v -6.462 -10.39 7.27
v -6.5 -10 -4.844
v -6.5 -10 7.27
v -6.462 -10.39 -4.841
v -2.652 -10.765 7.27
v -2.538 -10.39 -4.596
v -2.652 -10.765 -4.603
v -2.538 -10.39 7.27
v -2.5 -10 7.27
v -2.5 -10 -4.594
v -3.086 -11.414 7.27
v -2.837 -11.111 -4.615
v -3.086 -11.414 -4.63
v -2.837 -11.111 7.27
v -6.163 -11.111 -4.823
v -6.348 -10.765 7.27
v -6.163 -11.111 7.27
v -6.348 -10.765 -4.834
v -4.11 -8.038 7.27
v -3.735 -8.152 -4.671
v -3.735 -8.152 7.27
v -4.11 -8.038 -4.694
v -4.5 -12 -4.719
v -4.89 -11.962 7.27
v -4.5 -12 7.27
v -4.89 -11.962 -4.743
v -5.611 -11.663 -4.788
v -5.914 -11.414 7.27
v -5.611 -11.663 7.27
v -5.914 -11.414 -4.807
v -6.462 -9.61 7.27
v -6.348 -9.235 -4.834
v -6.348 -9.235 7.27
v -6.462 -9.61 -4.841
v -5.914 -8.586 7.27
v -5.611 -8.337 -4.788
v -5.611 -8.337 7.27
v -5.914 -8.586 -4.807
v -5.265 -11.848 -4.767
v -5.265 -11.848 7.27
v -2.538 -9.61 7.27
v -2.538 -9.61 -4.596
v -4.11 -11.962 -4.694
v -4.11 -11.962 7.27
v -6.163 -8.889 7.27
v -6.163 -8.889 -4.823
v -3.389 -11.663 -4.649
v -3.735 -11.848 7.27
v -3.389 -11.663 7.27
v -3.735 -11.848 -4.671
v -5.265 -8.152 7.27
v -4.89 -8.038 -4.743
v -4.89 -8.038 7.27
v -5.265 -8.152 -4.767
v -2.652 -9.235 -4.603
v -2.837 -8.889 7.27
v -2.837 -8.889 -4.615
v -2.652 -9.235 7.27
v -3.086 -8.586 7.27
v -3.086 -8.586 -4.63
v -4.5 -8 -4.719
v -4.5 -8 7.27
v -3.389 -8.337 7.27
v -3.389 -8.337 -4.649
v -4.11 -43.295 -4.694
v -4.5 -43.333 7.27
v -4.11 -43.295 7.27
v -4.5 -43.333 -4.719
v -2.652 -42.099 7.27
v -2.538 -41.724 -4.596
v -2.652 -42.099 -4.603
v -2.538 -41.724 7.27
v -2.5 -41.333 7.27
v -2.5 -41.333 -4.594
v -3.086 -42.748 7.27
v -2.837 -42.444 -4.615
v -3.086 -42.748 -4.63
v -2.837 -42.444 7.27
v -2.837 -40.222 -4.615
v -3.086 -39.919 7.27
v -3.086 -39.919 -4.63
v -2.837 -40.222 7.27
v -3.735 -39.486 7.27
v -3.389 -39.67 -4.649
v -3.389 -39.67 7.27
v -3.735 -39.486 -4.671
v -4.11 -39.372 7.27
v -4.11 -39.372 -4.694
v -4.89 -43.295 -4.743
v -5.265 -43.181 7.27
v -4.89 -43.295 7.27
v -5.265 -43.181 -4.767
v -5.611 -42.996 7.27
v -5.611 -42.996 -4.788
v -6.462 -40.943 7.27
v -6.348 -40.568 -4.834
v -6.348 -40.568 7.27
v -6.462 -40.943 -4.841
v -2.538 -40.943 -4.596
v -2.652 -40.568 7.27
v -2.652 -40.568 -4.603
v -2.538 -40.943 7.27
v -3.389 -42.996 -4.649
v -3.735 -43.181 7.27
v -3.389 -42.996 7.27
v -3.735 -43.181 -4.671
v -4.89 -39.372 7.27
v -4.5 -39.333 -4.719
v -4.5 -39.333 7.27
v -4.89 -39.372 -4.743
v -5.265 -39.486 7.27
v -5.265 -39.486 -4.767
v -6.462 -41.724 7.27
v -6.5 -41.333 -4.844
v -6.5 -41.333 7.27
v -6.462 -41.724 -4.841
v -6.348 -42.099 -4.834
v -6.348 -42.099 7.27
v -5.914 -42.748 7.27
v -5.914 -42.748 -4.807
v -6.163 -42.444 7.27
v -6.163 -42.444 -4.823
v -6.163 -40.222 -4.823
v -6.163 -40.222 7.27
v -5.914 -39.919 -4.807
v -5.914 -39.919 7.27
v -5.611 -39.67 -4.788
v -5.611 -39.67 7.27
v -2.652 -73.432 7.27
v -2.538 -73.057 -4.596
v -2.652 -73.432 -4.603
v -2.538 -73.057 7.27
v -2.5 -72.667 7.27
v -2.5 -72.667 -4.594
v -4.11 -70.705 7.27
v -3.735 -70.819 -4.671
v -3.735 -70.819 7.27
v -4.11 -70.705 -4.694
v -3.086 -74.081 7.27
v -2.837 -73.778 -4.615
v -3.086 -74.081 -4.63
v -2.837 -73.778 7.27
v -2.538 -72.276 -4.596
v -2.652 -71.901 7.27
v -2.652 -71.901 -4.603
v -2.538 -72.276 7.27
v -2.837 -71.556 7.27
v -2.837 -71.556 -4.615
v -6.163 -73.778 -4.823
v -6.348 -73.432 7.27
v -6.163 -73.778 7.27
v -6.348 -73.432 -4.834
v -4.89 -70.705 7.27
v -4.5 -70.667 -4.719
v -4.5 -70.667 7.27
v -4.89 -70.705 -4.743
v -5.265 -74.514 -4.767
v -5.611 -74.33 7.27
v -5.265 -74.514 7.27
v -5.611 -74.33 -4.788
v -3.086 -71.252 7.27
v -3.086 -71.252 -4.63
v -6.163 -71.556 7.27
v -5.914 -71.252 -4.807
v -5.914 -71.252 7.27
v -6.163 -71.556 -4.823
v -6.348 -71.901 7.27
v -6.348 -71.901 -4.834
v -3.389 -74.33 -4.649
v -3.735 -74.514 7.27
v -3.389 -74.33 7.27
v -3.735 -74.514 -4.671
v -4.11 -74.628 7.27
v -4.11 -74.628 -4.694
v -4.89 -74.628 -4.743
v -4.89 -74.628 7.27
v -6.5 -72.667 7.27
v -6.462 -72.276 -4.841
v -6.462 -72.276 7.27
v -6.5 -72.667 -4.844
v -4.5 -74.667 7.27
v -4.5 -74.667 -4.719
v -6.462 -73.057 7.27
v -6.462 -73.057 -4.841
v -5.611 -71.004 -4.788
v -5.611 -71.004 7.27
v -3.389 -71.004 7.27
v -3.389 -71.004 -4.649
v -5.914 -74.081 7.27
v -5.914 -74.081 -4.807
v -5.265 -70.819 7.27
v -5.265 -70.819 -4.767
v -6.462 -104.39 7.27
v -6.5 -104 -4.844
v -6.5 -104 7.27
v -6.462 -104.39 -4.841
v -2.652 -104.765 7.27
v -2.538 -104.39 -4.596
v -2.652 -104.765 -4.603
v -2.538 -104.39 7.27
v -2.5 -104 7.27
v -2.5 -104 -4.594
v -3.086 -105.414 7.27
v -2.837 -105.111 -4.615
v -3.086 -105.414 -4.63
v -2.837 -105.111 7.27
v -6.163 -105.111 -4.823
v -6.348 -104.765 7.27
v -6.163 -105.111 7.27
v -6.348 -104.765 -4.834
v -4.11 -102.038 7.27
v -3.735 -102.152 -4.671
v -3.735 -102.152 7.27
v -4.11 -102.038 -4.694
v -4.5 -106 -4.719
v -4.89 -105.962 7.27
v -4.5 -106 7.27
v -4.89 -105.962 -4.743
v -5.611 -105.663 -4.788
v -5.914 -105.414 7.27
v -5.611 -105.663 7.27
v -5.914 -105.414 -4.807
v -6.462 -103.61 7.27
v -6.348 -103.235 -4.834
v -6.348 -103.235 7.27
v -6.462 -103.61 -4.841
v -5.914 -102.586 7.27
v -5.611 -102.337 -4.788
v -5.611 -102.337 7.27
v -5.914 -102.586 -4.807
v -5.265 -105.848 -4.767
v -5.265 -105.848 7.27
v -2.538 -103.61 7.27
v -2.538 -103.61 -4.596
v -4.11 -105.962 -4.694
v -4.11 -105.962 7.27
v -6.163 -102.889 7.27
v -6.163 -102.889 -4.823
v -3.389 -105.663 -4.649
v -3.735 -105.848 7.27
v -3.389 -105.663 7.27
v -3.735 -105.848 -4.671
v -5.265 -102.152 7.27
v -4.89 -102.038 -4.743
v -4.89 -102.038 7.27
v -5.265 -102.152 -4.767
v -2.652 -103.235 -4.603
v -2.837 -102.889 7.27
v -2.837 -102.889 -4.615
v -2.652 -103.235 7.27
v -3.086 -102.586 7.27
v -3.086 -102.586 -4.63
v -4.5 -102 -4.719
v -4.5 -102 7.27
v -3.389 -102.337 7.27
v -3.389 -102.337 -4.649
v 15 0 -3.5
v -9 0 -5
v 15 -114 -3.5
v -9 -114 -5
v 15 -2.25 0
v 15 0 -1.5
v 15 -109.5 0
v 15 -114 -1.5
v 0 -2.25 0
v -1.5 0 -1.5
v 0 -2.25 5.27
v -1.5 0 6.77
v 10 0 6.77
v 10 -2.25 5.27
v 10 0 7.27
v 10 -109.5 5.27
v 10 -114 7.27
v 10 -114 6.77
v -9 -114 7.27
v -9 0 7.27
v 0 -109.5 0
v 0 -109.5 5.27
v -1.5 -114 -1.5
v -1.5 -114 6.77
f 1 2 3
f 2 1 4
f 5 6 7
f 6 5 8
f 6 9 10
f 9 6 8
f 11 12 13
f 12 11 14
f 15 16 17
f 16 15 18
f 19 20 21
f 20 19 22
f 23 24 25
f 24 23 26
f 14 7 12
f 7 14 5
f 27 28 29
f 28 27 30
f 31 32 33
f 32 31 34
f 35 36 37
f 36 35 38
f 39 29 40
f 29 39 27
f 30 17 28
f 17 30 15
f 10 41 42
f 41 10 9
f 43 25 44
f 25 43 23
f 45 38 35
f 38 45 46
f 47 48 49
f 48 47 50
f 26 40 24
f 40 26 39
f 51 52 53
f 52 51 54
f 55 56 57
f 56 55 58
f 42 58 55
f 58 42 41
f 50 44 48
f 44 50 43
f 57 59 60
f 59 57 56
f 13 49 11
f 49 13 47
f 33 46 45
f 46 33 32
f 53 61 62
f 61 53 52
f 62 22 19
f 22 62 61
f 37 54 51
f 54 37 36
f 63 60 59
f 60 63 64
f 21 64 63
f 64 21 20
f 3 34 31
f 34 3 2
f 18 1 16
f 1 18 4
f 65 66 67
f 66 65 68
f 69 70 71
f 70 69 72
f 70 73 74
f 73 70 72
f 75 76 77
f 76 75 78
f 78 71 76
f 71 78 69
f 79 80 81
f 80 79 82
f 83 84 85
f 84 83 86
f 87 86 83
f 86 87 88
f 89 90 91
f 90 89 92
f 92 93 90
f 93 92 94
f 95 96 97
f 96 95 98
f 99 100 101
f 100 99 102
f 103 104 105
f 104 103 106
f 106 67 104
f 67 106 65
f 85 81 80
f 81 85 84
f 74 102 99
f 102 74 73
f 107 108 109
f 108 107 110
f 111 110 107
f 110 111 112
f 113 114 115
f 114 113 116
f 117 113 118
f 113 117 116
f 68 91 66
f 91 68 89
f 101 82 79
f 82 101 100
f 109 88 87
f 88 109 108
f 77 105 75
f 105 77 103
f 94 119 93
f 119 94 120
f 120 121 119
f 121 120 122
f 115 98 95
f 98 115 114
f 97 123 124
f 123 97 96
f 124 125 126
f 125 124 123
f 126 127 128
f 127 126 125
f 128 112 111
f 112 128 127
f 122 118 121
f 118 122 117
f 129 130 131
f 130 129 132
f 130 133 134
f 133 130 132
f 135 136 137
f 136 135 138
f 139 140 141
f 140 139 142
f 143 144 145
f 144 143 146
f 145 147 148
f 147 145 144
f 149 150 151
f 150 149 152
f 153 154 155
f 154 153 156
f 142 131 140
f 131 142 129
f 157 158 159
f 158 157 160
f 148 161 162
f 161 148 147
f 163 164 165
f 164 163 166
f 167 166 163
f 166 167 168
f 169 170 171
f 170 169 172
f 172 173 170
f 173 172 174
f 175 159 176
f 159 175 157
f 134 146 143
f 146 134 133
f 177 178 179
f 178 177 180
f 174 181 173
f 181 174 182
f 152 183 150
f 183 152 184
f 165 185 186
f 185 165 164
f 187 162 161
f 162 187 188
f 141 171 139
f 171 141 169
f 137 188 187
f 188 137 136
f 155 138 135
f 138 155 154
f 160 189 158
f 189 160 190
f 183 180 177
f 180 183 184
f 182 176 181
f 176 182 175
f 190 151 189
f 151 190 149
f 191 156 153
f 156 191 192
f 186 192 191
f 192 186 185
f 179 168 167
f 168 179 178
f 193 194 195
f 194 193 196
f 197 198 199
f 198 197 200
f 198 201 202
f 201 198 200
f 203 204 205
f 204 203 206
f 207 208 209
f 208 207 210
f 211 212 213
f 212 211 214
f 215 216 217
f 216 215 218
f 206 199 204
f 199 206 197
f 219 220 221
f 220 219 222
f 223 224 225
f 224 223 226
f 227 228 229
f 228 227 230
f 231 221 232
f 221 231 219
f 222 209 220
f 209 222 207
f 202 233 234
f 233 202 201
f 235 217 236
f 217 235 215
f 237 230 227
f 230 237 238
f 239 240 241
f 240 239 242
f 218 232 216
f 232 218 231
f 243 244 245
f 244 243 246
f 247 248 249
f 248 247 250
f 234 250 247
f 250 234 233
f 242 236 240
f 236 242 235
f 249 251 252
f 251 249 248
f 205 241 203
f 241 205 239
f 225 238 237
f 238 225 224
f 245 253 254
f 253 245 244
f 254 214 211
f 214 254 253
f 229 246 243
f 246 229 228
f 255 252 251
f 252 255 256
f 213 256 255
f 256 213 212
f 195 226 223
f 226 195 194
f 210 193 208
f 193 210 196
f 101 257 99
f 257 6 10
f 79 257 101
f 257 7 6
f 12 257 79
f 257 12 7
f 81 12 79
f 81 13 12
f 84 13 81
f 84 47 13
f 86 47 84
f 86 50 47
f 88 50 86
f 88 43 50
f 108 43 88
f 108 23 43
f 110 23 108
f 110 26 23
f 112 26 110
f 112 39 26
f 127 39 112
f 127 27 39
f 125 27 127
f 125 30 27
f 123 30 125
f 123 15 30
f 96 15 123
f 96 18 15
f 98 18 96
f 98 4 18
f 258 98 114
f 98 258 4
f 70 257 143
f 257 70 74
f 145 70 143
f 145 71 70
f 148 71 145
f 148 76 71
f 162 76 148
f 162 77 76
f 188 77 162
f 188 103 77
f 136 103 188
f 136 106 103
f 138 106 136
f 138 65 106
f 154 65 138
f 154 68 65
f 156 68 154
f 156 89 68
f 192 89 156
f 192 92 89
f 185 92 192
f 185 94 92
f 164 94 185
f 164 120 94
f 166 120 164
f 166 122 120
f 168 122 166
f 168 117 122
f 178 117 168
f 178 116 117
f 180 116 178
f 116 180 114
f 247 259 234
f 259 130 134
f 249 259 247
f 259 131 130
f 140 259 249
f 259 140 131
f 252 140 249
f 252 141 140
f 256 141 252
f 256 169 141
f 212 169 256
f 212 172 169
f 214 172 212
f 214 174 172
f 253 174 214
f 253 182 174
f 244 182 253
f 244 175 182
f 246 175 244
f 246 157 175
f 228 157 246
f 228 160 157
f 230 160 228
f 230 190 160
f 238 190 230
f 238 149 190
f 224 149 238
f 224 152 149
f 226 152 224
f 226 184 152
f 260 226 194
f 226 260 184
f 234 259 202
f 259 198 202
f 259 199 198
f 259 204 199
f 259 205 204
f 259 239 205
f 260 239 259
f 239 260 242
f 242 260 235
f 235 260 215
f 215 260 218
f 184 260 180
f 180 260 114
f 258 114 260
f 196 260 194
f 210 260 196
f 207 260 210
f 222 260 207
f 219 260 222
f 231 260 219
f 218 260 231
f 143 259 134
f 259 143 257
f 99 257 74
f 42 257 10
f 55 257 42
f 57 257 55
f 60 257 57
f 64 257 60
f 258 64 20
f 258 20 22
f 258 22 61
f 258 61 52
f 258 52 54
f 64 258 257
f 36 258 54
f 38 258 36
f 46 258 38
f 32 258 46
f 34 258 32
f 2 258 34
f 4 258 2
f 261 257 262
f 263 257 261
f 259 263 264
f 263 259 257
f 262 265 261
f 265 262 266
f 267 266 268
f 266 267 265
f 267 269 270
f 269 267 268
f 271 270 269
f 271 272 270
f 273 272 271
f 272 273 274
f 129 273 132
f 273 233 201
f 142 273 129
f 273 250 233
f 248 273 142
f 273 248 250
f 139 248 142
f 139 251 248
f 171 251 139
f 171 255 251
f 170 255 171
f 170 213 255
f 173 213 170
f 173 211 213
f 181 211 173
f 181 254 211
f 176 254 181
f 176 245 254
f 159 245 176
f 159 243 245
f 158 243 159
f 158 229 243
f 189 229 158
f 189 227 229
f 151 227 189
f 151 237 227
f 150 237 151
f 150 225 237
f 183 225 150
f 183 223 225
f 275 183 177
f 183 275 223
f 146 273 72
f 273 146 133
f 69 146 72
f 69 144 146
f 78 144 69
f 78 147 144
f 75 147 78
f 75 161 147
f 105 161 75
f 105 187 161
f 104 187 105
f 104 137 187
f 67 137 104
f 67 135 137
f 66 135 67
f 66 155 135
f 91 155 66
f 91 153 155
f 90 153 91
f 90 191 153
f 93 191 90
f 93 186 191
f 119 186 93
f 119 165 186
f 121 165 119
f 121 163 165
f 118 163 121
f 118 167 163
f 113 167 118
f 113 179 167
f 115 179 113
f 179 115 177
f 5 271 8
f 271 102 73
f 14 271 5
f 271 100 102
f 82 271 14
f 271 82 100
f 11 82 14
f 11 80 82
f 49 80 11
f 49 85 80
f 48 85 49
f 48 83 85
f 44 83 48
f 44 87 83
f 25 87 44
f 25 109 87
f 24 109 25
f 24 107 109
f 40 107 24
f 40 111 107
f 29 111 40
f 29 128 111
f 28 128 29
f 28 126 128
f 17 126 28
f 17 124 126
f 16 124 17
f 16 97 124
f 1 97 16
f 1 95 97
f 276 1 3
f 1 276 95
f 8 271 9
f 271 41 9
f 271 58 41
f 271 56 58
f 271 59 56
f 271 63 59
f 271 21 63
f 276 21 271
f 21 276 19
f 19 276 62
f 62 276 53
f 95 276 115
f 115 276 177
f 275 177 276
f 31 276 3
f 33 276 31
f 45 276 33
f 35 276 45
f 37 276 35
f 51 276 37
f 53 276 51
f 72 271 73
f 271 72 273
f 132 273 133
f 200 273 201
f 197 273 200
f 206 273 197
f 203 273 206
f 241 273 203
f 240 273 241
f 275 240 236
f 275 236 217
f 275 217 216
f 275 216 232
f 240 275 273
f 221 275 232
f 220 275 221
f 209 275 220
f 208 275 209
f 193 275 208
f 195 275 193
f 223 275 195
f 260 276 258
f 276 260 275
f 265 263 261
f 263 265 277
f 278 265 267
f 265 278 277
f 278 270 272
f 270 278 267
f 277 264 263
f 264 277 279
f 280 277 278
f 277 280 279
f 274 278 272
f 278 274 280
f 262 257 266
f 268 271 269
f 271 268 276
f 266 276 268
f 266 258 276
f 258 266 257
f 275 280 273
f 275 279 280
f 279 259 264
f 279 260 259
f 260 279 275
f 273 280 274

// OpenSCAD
use <tubemesh.scad>;

boardThickness = 5.27;
length = 114; 
inset1 = 1.5; 
inset2 = 1.5; 
insetRatio = 1.5;
bottomSlideWidth = 15;
topSlideWidth = 10;
holderWidth = 9;
tolerance = 0;
bottomMinimumThickness = 3.5;
bottomMaximumThickness = 5;
topThickness = 2;
holeDiameter = 4;
hole1Offset = 10; 
numHoles = 4;

function crossSection(inset=0) =
        [[-holderWidth,-bottomMaximumThickness],
        [bottomSlideWidth,-bottomMinimumThickness],
        [bottomSlideWidth,-inset],
        [-inset,-inset],
        [-inset,boardThickness+tolerance+inset],
        [topSlideWidth,boardThickness+tolerance+inset],
        [topSlideWidth,boardThickness+tolerance+topThickness],
        [-holderWidth,boardThickness+tolerance+topThickness]];

module slide() {
    s0 = crossSection(inset=inset1);
    s1 = crossSection();
    s2 = crossSection(inset=inset2);
    tubeMesh([sectionZ(s0,0), sectionZ(s1,inset1*insetRatio), sectionZ(s1,length-(inset1+inset2)*insetRatio), sectionZ(s2,length)]);
}

rotate([90,0,0])
render(convexity=2)
difference() {
    slide();
    for (i=[0:numHoles-1]) {
        z = (length-(hole1Offset*2))/(numHoles-1)*i+hole1Offset;
        translate([-holderWidth/2,0,z])
        rotate([90,0,0])
        cylinder(h=100,d=holeDiameter,center=true,$fn=32);
    }
}
